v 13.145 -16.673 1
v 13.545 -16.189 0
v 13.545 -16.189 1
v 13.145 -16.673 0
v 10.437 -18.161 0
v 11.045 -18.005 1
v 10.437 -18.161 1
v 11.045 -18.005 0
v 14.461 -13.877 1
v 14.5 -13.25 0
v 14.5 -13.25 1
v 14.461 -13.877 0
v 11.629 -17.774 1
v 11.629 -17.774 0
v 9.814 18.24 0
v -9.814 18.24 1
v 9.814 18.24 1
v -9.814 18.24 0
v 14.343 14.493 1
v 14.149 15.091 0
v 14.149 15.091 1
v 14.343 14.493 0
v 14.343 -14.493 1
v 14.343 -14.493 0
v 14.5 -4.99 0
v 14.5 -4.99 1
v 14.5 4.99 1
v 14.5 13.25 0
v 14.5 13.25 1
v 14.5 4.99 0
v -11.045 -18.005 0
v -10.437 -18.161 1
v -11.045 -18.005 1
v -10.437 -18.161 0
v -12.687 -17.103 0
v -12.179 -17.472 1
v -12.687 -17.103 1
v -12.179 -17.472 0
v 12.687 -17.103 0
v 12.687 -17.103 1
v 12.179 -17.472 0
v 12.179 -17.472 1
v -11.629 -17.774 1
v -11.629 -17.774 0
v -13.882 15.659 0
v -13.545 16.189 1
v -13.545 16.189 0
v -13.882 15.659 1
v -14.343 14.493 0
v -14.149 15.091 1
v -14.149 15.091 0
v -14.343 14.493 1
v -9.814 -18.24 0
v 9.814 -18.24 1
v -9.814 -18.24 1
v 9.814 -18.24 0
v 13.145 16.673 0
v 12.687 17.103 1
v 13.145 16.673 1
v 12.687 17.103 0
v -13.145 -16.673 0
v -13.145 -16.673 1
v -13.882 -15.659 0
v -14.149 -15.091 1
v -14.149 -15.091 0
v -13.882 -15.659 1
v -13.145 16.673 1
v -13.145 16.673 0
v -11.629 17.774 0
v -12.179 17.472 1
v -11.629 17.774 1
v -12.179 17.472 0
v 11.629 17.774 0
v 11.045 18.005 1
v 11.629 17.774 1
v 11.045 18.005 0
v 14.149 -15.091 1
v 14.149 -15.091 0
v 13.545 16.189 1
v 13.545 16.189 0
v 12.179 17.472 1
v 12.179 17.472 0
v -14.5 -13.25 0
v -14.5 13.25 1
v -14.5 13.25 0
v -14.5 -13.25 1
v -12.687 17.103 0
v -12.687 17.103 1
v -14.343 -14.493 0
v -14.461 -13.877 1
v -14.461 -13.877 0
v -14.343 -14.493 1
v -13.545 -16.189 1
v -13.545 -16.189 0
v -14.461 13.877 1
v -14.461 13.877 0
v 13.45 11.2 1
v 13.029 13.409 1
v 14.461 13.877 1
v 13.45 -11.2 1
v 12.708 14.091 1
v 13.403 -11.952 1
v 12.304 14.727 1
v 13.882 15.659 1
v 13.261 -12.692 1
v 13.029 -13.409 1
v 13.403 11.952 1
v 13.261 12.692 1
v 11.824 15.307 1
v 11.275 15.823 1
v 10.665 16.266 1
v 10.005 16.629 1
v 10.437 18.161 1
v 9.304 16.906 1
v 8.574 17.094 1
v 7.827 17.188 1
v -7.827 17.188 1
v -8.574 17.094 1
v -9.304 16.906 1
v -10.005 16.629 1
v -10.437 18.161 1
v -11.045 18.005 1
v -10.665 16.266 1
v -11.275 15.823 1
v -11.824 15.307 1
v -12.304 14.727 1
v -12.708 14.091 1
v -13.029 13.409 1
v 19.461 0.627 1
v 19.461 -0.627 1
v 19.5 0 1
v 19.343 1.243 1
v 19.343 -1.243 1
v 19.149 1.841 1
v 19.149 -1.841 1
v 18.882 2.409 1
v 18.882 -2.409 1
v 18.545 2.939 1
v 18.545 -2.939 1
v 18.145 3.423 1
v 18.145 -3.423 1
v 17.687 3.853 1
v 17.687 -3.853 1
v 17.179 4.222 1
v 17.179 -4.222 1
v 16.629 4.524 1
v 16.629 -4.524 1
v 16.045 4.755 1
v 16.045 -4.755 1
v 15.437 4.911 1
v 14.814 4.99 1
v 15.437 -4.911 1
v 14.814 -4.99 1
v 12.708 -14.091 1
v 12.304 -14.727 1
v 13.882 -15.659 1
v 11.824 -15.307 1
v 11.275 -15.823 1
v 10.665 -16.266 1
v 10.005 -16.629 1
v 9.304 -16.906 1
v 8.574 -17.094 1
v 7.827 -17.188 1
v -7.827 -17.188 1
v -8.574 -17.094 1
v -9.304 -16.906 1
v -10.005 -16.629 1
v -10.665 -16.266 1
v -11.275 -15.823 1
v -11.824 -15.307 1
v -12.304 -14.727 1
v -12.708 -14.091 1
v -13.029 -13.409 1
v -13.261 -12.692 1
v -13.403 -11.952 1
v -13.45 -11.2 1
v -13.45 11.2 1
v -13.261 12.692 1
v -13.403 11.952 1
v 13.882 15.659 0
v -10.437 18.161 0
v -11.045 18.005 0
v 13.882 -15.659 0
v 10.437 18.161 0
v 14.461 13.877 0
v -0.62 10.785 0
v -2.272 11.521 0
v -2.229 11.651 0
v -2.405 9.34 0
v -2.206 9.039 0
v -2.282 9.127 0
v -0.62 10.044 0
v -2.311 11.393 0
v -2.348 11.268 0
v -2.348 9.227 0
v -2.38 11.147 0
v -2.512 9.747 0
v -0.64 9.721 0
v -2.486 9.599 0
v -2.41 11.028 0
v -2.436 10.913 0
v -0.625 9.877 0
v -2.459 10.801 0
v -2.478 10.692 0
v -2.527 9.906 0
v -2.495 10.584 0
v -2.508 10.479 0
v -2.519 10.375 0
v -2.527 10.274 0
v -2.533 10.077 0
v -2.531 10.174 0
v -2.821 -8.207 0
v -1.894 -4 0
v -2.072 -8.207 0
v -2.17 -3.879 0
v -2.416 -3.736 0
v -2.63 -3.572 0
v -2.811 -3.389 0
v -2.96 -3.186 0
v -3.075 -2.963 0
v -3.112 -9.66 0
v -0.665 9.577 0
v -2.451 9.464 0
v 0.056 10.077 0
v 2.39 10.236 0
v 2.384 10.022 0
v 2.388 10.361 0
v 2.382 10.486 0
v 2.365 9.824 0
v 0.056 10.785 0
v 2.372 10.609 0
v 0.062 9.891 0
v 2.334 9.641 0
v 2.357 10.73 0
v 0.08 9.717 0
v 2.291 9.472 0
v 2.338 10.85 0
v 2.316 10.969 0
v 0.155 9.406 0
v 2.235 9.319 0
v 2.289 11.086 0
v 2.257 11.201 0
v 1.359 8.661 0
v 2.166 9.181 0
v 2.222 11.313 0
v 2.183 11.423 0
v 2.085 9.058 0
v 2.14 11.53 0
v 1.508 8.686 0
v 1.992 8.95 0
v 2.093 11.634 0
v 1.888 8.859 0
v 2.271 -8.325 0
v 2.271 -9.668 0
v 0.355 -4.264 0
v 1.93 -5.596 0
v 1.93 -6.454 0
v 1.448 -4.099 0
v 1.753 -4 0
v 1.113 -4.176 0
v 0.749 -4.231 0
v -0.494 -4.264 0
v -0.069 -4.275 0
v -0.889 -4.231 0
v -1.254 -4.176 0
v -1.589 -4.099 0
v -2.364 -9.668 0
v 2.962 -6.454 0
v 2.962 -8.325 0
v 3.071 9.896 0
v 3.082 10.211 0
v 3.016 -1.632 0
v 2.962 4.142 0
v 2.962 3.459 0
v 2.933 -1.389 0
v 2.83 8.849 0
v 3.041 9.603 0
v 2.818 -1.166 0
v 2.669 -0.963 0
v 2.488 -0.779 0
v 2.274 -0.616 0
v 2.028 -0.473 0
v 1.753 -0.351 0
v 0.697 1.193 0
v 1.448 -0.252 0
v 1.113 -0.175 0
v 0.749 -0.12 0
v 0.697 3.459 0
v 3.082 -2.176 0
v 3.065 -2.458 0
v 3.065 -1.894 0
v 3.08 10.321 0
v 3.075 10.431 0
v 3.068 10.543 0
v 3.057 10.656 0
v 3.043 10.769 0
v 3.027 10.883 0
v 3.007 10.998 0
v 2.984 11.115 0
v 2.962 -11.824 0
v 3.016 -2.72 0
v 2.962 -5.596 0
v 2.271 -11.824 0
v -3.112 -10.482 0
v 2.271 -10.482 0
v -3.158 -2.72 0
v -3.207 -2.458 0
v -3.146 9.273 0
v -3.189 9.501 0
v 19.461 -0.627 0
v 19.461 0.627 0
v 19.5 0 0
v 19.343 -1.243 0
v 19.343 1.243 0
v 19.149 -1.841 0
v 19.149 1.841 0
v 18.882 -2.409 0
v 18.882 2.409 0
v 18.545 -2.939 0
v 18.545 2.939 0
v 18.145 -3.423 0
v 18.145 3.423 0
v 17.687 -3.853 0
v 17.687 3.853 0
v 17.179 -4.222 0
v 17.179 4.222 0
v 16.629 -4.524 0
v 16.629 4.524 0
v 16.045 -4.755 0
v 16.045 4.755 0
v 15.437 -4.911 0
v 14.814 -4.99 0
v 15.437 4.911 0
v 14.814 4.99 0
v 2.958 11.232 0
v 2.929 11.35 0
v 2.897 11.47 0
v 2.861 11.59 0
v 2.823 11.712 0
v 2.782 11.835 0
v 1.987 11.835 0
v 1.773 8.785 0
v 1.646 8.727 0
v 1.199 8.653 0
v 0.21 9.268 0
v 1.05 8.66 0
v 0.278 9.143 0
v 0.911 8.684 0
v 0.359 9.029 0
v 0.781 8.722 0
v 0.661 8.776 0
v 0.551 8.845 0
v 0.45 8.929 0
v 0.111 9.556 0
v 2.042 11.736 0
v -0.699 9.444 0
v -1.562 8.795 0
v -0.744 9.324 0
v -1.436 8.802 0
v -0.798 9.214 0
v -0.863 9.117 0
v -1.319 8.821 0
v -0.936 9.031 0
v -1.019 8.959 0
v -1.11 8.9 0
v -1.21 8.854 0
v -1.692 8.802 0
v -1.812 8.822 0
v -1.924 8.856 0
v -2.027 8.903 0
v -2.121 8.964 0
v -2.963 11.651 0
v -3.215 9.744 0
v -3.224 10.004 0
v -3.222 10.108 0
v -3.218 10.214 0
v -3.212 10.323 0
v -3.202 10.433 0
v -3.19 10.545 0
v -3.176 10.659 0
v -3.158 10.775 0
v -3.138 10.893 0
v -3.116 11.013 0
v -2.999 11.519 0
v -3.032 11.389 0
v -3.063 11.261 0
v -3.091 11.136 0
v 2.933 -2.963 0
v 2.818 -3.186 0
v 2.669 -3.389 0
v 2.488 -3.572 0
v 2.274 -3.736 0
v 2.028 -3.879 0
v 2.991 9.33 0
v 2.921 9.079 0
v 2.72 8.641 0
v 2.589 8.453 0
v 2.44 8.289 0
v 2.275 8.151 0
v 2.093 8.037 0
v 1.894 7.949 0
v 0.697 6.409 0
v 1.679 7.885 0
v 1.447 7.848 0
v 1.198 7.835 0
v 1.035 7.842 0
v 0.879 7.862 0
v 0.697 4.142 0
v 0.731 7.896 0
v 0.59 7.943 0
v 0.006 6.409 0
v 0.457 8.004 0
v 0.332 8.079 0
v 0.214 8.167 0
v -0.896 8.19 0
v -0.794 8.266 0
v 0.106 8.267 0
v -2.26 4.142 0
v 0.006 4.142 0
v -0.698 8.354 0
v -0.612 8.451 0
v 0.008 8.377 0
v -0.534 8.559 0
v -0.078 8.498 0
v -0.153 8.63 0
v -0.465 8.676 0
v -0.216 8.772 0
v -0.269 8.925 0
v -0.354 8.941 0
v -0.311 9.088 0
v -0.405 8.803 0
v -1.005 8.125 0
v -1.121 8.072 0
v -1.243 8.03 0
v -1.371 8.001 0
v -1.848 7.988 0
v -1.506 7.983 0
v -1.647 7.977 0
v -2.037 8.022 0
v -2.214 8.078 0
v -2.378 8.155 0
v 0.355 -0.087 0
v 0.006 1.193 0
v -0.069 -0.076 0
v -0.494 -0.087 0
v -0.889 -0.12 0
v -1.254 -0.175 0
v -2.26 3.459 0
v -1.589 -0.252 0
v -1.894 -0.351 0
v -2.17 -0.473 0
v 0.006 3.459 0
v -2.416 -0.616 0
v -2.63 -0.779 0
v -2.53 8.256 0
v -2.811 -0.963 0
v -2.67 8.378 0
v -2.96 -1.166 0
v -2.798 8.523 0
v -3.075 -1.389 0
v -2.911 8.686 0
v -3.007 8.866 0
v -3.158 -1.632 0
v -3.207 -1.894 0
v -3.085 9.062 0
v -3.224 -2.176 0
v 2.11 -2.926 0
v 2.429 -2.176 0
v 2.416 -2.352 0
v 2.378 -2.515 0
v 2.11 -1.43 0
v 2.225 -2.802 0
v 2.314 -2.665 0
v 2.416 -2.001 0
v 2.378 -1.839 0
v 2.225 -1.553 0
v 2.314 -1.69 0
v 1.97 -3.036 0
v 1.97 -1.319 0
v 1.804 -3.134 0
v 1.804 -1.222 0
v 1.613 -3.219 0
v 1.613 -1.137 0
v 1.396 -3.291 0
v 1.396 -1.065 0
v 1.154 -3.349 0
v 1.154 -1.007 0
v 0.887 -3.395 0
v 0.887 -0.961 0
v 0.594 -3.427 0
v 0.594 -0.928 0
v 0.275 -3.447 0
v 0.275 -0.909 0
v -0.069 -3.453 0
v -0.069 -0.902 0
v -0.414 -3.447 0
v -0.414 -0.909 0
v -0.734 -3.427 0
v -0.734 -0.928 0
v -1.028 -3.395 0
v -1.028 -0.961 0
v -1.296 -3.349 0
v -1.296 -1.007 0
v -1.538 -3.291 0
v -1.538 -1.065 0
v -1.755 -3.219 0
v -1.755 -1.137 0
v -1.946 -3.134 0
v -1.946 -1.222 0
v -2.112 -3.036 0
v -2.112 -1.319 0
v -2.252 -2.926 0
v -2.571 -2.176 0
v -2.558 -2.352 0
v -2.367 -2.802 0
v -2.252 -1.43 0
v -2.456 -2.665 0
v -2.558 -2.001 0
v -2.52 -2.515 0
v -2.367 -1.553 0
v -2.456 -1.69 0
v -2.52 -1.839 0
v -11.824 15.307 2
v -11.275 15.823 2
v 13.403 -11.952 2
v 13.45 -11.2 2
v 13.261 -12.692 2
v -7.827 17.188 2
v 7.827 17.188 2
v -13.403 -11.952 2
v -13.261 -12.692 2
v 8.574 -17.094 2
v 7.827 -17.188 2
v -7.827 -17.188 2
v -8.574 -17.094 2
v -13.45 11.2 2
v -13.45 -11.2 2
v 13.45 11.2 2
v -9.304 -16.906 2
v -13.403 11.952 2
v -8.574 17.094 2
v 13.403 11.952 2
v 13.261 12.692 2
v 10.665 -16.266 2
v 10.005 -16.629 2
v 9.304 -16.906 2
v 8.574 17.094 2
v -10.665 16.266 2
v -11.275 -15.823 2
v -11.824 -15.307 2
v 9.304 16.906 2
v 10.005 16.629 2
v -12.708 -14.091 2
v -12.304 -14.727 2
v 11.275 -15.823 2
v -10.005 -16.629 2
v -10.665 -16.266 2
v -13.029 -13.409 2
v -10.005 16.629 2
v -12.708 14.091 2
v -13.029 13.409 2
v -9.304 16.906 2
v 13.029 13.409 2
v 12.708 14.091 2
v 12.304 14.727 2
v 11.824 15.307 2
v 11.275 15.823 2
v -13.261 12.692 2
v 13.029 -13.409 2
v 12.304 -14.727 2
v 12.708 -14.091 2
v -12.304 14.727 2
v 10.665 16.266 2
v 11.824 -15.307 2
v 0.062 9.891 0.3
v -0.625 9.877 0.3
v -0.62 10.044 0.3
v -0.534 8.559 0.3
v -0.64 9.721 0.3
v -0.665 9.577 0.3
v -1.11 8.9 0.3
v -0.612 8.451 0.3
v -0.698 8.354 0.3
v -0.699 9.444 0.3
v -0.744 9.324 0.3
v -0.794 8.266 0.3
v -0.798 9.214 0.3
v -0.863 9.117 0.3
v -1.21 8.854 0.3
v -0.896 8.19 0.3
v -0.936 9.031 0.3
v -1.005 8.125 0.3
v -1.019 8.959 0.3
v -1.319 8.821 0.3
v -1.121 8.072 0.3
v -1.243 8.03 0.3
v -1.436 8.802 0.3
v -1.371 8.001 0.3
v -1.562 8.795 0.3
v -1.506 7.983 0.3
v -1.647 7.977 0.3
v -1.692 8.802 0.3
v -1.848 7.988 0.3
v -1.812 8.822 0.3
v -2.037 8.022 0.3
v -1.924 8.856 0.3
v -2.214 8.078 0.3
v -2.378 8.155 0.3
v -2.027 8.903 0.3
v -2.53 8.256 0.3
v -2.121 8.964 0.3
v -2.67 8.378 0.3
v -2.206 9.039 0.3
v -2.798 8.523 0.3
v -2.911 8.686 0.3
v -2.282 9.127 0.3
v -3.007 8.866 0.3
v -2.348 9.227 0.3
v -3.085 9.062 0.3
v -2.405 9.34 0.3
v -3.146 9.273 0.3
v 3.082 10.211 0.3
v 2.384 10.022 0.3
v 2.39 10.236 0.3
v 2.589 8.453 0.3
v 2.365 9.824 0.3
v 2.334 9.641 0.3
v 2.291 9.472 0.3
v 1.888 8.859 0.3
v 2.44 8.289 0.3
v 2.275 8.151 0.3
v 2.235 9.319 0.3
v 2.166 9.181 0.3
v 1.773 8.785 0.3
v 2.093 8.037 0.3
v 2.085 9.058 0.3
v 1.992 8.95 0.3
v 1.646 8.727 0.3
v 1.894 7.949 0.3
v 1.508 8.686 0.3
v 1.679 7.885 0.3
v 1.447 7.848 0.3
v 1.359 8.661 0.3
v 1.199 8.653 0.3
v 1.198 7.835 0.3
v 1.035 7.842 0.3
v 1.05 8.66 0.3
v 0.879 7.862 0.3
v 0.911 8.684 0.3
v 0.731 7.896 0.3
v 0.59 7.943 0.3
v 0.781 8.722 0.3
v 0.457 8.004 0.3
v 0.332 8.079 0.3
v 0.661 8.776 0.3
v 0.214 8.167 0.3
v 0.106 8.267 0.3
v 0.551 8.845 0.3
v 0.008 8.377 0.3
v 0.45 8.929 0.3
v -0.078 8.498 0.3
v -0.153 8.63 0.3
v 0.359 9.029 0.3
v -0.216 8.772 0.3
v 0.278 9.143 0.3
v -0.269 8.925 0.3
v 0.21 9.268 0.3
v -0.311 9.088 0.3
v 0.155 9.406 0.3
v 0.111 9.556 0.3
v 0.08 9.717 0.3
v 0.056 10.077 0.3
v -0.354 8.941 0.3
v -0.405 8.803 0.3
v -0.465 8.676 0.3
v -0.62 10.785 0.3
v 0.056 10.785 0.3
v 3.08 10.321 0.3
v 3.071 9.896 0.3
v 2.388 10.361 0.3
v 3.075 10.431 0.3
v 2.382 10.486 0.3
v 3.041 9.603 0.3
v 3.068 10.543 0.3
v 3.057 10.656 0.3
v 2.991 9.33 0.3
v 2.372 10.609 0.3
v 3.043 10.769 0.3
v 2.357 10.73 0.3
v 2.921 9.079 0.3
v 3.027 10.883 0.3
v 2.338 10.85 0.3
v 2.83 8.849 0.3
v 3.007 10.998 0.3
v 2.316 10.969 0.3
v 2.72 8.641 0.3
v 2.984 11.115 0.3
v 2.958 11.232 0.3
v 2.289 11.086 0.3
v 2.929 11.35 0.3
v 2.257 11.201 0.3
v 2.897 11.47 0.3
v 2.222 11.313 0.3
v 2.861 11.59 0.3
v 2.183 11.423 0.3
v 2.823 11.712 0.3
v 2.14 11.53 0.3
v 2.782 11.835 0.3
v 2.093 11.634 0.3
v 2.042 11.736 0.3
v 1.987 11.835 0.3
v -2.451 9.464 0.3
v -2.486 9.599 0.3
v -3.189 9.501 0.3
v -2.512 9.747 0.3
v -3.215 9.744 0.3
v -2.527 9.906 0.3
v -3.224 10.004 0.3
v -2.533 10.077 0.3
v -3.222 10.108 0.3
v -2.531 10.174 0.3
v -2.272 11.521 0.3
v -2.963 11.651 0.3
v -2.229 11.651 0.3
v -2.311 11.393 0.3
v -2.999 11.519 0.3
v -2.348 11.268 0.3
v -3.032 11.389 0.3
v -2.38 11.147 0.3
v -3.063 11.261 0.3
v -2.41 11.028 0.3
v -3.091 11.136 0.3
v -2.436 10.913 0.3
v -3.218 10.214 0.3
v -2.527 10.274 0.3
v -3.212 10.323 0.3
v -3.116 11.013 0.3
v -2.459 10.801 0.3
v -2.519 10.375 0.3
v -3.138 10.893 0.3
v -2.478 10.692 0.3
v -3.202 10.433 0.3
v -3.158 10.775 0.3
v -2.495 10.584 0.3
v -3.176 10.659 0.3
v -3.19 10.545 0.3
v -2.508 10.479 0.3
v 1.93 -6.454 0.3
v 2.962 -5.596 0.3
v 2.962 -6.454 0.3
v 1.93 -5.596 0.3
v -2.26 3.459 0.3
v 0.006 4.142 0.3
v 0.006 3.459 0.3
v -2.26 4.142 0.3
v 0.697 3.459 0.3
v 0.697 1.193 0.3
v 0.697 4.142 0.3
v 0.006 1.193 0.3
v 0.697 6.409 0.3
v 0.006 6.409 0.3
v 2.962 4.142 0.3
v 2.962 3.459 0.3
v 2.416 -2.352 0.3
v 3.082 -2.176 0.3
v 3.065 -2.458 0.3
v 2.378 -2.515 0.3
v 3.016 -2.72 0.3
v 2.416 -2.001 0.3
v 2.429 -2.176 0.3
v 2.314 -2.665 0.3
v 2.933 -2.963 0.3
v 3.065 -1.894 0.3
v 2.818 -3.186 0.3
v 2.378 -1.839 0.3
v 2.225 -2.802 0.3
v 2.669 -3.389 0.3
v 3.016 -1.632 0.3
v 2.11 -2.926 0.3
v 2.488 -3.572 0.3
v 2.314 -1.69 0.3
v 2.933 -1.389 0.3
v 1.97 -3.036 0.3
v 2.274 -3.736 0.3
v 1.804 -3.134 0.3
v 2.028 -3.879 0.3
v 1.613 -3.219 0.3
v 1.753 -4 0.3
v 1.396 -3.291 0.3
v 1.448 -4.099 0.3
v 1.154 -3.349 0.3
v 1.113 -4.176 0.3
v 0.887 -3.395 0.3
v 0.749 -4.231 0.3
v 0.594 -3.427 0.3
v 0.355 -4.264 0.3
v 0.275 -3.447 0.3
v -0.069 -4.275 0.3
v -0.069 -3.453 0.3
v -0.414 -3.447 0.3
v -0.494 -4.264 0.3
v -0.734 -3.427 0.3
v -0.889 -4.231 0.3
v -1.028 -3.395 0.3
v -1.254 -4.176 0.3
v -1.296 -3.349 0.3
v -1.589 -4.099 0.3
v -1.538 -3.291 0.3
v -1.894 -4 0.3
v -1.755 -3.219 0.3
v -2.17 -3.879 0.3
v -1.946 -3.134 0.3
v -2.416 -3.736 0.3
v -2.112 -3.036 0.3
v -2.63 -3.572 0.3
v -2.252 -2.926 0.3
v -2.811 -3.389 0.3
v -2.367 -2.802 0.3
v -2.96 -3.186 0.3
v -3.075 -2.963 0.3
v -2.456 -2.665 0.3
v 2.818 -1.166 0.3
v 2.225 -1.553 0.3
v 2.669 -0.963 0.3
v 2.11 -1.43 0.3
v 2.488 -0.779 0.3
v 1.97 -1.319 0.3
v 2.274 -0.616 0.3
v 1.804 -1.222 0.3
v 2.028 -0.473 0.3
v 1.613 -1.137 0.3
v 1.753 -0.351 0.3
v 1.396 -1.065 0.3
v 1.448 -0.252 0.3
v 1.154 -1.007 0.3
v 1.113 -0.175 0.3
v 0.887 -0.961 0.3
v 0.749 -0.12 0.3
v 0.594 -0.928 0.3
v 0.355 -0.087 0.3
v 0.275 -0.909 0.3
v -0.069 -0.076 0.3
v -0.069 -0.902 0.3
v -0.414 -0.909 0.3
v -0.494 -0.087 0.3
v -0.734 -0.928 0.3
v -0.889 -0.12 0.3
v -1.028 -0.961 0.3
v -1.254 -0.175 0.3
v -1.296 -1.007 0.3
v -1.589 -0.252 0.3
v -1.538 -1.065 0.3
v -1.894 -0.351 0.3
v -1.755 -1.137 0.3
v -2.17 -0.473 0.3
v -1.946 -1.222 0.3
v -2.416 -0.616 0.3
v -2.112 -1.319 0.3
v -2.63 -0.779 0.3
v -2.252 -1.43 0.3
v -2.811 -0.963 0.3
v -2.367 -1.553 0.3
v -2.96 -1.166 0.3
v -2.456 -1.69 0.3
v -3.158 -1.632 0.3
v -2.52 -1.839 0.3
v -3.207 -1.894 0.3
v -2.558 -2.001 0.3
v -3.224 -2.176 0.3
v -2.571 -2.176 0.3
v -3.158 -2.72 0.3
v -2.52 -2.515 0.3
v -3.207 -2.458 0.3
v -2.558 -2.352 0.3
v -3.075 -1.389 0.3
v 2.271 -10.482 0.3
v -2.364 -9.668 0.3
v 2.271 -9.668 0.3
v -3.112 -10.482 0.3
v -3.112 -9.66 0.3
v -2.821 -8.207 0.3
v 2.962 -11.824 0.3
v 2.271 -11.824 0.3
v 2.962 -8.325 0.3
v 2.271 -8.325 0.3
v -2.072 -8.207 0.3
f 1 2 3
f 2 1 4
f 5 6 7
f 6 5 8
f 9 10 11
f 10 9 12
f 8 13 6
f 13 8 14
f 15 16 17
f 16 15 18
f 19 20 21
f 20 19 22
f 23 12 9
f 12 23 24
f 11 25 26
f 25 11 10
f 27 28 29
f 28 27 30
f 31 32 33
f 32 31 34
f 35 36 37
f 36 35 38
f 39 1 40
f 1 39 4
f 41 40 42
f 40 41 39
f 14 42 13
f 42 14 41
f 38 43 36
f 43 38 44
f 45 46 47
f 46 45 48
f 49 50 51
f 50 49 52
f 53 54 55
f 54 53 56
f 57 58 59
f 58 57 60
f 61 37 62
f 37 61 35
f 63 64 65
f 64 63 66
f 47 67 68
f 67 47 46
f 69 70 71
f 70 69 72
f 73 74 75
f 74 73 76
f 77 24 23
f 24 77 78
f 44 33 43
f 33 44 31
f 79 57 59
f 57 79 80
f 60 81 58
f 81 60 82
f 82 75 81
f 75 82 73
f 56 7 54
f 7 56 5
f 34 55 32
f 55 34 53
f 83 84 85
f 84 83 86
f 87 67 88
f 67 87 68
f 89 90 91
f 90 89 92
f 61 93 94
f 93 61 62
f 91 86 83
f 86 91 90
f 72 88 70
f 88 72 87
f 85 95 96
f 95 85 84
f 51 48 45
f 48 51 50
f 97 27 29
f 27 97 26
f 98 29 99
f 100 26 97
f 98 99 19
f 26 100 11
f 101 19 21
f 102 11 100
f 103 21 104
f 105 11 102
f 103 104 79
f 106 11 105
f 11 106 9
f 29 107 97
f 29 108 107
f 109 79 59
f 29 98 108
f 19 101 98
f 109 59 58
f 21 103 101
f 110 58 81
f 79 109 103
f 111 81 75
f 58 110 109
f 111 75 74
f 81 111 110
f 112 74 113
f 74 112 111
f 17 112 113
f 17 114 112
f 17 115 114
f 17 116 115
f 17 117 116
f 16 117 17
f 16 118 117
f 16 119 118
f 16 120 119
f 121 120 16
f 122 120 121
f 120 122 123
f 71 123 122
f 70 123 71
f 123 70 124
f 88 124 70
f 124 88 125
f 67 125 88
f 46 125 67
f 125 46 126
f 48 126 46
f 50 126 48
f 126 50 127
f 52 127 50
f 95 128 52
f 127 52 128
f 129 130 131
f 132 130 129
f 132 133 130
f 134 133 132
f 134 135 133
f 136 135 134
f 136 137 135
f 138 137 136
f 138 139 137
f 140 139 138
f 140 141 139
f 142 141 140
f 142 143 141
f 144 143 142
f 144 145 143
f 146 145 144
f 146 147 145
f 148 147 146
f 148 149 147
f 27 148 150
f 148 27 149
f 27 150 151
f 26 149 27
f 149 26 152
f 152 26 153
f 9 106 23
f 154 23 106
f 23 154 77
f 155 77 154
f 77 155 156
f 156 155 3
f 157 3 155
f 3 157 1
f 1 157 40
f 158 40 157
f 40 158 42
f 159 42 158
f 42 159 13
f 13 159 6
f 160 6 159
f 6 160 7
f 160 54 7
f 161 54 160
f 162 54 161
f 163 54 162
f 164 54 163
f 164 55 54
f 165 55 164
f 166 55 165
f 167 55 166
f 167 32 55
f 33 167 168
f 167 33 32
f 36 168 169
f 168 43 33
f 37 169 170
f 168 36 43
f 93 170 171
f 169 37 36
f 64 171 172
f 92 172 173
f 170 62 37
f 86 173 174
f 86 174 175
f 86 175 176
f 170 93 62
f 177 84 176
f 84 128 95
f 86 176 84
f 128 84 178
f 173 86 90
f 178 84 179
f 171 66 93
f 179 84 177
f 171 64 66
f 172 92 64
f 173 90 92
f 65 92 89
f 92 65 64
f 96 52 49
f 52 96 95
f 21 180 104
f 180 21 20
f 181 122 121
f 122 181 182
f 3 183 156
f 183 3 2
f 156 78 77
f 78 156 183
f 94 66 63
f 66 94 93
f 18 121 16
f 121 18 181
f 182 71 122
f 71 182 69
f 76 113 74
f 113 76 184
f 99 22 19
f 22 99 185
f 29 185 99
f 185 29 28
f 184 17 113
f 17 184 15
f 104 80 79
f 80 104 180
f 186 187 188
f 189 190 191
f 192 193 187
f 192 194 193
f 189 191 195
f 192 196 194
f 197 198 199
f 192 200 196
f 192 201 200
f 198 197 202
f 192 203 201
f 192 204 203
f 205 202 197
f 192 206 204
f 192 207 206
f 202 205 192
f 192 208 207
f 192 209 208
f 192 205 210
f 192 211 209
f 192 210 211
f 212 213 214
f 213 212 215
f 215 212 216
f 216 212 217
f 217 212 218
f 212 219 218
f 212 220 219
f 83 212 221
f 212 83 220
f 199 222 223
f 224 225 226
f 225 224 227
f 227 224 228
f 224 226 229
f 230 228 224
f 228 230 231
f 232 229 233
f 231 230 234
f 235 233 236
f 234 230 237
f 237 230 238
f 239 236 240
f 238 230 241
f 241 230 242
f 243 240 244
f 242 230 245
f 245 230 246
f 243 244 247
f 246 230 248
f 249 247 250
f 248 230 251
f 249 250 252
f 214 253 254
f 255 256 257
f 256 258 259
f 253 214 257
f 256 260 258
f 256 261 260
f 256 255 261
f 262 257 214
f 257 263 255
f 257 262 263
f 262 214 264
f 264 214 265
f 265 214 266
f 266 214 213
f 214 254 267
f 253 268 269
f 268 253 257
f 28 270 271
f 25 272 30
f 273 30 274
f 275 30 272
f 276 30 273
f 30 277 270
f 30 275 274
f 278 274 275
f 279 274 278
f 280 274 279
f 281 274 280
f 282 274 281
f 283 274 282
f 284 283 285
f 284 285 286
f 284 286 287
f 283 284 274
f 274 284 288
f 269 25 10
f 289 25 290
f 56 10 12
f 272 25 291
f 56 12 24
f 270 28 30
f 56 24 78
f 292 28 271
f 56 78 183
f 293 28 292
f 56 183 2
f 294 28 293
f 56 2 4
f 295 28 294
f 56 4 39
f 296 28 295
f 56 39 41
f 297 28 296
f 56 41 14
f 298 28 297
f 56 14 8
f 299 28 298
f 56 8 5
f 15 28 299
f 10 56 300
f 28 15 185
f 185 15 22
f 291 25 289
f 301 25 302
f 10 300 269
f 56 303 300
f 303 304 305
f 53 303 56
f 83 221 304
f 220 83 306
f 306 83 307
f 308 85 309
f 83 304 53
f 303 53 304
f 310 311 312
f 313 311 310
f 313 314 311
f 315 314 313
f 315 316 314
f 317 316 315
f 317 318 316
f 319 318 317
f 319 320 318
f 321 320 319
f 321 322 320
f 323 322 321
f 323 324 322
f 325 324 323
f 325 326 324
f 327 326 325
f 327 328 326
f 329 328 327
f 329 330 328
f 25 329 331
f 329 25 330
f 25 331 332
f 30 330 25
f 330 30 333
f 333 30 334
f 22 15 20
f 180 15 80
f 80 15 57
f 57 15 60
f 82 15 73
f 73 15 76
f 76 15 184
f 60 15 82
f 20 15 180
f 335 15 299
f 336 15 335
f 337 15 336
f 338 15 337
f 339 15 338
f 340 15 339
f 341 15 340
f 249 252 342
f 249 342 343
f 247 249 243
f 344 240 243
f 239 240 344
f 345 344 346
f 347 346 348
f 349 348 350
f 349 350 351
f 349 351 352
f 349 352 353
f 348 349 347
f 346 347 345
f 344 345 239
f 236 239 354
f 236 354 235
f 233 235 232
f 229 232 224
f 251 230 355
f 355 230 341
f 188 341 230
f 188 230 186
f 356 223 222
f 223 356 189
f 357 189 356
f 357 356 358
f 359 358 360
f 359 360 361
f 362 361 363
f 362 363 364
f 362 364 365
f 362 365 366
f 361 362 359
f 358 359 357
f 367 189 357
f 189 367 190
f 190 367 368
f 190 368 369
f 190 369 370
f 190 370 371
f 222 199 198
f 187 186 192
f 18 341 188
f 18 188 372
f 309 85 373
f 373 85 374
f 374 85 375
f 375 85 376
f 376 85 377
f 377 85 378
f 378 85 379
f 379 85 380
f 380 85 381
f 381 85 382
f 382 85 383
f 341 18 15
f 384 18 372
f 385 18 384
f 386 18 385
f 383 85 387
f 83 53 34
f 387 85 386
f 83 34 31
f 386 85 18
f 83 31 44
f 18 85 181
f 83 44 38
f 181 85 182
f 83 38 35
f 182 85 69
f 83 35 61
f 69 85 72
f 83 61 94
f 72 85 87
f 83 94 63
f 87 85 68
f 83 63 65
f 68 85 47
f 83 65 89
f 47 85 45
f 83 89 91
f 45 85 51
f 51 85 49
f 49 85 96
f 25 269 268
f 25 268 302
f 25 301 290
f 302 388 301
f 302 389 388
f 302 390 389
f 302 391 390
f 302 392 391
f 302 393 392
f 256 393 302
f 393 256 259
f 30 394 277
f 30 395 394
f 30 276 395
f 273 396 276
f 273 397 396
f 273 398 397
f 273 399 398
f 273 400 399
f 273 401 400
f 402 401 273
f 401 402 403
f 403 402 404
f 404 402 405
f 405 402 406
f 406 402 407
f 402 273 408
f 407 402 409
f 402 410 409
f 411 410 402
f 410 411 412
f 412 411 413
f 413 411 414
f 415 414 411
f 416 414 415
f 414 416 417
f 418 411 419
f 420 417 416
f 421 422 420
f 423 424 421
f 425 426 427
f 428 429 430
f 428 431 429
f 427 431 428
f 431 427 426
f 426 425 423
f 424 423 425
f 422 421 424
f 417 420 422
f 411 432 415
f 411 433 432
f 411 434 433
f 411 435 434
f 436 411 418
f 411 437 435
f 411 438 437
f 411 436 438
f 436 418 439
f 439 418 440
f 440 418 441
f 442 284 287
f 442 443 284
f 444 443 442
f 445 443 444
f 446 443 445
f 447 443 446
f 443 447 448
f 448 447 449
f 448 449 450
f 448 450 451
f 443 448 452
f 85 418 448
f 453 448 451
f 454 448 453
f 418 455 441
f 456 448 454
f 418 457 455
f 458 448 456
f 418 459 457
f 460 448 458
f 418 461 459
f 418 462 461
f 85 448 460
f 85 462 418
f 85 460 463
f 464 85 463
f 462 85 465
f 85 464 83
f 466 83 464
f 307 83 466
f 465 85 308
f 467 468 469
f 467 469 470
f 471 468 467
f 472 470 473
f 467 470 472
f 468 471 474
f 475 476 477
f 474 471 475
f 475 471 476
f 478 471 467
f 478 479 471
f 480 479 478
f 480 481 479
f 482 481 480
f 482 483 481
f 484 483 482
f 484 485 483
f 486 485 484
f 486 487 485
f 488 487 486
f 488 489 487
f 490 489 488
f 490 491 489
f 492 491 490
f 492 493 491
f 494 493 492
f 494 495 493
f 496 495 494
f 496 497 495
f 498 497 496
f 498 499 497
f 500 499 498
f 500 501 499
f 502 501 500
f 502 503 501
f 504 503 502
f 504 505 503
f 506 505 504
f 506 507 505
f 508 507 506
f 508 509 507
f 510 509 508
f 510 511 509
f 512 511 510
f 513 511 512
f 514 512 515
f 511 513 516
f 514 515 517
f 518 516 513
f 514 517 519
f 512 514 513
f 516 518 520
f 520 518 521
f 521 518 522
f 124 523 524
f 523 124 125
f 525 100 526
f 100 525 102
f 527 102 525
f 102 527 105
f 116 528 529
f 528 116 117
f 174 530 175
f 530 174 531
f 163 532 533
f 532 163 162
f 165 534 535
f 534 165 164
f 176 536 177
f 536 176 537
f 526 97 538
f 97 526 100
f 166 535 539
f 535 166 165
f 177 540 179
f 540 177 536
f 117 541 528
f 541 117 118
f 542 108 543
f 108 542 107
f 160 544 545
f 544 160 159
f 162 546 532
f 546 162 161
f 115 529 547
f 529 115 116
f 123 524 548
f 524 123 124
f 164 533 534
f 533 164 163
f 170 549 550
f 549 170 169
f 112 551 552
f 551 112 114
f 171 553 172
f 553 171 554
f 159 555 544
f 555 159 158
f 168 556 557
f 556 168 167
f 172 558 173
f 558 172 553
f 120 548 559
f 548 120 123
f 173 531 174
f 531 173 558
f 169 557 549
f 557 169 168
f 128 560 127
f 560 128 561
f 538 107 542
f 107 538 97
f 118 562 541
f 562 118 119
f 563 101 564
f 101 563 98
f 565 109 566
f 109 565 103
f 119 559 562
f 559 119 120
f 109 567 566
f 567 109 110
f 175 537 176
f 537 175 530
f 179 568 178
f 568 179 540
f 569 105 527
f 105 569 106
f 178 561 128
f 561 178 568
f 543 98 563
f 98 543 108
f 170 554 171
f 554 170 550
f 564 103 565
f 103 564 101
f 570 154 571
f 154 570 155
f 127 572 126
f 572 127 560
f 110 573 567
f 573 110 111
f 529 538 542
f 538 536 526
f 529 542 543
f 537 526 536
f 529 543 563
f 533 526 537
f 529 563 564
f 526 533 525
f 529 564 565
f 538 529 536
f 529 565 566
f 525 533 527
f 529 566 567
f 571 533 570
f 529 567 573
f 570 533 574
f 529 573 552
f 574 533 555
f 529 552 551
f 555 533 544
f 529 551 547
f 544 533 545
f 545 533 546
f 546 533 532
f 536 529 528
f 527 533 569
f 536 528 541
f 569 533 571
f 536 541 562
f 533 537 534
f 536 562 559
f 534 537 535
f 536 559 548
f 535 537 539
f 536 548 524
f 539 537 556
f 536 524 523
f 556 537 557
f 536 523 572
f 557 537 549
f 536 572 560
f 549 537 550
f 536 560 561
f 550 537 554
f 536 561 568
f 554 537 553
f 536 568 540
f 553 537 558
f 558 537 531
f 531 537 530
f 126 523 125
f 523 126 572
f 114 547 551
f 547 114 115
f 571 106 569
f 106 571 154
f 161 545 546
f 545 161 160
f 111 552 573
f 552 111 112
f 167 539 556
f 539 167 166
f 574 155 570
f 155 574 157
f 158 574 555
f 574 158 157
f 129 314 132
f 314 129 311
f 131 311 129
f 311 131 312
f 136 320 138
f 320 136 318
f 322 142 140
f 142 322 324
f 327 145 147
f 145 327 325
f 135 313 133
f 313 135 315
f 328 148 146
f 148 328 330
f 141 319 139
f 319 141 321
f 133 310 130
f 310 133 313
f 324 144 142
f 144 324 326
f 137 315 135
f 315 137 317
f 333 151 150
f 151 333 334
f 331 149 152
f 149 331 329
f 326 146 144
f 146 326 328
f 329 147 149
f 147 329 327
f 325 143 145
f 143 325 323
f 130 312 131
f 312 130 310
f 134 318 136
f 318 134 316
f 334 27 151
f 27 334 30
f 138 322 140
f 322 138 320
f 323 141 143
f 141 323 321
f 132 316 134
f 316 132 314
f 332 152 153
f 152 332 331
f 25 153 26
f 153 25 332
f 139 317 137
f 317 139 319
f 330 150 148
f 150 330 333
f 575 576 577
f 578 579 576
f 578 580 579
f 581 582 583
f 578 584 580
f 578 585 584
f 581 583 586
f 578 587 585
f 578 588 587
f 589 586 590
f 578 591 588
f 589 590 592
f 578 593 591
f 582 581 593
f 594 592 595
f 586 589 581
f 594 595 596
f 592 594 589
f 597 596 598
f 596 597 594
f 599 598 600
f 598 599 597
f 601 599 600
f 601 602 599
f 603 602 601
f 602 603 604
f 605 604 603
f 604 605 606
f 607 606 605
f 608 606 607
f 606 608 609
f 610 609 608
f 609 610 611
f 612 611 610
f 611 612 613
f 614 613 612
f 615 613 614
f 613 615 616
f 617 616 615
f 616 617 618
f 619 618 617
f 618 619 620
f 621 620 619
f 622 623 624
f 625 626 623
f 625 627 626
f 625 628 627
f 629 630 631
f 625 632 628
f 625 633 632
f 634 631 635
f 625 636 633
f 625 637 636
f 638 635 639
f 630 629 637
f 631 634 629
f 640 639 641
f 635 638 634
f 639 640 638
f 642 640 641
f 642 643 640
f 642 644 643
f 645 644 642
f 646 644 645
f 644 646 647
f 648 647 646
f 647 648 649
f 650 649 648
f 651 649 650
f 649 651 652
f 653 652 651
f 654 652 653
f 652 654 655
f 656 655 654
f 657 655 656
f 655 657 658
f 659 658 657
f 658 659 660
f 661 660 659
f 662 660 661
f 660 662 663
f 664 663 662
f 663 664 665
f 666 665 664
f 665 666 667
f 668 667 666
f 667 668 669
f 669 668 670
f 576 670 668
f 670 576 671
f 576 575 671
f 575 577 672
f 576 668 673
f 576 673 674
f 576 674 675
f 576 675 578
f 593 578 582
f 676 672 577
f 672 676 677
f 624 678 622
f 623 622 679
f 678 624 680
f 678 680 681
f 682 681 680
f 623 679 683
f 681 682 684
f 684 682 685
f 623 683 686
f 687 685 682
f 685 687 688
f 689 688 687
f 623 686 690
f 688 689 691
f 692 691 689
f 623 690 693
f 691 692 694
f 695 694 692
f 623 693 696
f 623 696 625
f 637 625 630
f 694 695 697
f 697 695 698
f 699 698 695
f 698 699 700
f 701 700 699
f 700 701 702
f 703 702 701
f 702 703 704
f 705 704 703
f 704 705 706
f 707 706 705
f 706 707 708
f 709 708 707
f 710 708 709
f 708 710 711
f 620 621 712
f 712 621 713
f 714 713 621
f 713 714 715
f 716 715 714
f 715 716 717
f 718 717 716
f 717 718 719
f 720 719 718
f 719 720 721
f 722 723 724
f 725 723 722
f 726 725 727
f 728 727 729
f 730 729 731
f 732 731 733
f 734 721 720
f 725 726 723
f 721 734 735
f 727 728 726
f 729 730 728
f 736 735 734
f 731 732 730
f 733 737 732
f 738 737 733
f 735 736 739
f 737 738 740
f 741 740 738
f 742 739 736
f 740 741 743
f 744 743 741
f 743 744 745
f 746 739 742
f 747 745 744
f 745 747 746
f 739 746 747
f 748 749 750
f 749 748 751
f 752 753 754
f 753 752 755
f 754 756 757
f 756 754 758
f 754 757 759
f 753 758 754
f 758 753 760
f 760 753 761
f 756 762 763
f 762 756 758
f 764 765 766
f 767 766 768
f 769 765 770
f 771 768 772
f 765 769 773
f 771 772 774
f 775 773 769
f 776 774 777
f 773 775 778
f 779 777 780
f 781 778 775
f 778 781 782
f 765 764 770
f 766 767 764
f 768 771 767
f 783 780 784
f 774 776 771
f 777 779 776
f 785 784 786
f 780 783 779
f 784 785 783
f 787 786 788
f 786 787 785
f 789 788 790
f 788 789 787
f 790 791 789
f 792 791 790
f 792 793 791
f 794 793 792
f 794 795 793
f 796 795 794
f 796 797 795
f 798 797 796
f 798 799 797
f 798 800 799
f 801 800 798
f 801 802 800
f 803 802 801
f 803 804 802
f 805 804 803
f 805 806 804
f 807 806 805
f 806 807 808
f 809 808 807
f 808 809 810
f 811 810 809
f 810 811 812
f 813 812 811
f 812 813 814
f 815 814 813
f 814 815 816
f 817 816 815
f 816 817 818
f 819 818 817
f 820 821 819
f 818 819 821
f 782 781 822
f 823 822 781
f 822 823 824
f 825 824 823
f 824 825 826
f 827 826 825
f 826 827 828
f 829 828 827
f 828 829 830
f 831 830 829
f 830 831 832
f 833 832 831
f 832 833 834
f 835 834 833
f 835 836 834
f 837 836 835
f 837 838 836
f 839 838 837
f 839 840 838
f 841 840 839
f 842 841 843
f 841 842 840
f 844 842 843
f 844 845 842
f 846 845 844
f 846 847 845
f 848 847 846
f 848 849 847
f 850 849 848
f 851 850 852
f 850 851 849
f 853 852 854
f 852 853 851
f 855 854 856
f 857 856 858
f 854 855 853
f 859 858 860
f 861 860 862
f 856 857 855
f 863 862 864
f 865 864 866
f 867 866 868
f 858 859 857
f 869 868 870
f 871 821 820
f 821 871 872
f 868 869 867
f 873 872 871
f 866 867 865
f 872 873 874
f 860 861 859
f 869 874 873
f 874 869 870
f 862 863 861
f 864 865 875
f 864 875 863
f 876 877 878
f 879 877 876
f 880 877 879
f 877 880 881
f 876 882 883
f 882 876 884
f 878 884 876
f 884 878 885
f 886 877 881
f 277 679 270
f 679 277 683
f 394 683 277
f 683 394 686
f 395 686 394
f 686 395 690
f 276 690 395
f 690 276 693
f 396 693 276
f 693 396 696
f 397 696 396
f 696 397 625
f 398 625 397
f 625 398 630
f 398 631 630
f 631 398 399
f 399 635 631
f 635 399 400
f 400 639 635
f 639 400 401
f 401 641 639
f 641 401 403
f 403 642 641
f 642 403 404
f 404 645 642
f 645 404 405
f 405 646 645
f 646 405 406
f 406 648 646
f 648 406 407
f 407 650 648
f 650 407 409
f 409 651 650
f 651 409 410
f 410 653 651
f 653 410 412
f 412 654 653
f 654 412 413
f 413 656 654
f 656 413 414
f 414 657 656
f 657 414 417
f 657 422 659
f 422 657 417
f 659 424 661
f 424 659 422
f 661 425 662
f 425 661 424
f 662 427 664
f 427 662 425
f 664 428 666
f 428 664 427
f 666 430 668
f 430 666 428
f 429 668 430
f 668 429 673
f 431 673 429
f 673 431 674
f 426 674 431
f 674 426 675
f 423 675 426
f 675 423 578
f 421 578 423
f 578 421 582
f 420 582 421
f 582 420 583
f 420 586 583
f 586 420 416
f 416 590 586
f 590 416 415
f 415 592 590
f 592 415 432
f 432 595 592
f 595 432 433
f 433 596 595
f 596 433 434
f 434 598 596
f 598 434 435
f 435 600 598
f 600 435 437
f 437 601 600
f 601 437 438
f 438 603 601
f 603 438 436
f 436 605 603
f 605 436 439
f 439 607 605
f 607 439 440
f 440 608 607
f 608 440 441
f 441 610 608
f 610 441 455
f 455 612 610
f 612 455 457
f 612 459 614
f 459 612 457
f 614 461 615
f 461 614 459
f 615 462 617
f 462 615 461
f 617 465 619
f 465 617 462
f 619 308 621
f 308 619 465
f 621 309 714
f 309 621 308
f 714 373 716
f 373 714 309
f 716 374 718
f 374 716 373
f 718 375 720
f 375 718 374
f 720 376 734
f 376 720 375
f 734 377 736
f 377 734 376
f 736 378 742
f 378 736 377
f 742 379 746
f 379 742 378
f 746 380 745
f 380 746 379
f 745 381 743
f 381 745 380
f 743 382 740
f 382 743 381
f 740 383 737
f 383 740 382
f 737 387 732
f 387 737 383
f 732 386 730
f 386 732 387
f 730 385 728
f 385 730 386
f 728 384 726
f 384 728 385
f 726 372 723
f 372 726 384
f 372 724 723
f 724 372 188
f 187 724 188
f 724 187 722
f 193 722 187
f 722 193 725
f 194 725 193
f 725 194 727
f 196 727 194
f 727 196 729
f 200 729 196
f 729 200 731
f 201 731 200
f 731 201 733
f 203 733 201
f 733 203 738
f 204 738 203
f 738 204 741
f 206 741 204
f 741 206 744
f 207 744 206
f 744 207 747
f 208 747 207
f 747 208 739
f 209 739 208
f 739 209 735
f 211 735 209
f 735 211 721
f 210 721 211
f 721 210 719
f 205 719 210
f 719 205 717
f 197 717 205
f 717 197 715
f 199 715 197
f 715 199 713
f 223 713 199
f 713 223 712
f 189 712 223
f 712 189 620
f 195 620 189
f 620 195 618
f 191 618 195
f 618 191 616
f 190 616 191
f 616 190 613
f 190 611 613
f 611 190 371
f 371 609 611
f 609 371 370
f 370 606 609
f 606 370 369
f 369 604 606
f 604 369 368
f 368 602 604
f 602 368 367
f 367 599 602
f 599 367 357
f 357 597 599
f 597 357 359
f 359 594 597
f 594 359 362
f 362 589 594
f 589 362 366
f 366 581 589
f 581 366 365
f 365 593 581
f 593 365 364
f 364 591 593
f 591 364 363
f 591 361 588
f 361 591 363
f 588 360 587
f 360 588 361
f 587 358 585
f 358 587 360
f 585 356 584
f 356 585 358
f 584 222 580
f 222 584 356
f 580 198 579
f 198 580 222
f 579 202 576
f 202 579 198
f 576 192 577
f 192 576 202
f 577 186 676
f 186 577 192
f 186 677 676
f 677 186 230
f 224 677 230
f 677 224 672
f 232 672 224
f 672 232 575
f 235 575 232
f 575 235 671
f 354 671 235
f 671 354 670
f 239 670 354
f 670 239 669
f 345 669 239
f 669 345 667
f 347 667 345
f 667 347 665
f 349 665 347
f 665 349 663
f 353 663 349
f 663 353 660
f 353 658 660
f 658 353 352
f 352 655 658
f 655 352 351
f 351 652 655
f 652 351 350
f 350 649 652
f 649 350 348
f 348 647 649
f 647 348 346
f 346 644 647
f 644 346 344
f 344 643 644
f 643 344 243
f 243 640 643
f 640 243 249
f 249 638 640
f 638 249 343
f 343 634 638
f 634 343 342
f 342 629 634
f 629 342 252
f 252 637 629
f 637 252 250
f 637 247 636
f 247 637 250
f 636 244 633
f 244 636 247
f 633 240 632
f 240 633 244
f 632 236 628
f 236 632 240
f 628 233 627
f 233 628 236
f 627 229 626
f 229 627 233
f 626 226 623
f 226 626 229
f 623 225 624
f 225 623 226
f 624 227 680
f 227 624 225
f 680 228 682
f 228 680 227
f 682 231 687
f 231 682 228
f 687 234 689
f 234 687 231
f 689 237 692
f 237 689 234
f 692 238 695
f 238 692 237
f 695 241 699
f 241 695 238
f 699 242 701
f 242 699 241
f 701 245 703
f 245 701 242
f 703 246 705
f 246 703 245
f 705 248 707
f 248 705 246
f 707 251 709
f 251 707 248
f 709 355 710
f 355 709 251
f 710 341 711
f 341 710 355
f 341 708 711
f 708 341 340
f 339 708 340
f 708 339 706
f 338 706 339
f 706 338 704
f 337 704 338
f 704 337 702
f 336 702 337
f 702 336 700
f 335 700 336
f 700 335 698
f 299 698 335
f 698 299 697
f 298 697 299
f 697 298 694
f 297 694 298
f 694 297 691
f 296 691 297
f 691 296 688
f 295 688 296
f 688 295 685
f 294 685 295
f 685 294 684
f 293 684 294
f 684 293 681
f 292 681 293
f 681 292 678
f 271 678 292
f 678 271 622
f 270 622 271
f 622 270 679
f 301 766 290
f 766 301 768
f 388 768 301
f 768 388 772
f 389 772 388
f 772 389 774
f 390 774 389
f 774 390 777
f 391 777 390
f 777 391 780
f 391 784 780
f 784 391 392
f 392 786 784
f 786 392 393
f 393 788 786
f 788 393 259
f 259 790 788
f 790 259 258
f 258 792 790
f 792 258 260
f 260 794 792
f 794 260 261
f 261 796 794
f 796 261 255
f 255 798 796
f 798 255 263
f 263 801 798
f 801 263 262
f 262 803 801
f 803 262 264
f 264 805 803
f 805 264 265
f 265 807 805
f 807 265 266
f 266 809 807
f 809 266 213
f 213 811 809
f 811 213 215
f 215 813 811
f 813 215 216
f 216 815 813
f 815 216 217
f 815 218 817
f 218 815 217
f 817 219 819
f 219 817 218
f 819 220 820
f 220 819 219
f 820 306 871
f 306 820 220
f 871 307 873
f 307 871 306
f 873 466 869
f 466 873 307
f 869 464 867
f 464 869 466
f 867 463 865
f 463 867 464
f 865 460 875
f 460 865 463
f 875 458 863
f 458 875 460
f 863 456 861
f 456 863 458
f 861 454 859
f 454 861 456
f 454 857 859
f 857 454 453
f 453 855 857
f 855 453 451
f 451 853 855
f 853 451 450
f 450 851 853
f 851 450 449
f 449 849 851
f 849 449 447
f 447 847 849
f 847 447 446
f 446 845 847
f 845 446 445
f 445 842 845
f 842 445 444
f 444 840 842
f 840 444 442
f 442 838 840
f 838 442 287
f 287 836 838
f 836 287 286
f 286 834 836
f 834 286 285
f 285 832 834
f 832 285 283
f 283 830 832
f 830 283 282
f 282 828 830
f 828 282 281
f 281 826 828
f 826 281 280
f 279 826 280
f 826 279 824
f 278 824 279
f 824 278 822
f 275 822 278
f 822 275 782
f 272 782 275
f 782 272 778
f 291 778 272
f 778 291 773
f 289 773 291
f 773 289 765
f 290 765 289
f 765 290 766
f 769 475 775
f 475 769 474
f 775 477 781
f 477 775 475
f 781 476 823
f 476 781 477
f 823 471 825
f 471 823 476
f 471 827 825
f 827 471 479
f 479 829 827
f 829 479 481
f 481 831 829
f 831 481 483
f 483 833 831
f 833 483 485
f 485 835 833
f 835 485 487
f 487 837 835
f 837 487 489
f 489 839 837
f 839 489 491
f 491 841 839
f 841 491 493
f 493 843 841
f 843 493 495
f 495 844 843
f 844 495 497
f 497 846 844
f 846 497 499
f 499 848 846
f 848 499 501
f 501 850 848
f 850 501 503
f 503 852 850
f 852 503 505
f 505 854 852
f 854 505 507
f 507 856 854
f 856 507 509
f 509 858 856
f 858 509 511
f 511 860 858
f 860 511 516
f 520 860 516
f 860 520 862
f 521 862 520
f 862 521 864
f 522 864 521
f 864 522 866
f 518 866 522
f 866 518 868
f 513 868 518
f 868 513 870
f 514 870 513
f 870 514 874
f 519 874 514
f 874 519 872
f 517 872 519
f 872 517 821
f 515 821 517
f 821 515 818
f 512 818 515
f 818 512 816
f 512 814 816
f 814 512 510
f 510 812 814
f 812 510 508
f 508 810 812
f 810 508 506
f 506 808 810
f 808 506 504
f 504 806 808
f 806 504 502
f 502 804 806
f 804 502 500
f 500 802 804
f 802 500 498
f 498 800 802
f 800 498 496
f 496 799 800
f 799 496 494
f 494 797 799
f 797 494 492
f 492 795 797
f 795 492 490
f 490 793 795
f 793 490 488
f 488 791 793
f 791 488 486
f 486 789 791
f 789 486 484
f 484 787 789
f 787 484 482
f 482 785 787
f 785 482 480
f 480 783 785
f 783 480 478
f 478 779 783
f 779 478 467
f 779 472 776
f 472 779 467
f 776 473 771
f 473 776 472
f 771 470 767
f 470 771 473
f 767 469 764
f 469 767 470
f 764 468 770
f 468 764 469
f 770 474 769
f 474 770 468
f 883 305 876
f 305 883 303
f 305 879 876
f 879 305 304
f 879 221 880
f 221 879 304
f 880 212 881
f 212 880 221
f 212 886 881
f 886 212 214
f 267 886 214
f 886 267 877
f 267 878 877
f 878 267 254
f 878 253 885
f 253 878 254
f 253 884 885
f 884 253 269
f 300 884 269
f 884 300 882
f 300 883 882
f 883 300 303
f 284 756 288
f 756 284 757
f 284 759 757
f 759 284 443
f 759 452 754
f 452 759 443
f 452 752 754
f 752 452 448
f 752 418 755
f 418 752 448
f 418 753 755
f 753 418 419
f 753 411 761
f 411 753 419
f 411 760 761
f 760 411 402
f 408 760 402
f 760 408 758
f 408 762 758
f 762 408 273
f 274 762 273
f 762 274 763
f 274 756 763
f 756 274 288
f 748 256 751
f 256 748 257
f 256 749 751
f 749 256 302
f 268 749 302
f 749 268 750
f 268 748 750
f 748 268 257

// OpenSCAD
$fn = 50;


difference() {
	union() {
		translate(v = [0, 0, 0]) {
			rotate(a = [0, 0, 0]) {
				hull() {
					translate(v = [-9.5000000000, 13.2500000000, 0]) {
						rotate(a = [0, 0, 0]) {
							translate(v = [0, 0, 0]) {
								rotate(a = [0, 0, 0]) {
									cylinder(h = 1, r = 5);
								}
							}
						}
					}
					translate(v = [9.5000000000, 13.2500000000, 0]) {
						rotate(a = [0, 0, 0]) {
							translate(v = [0, 0, 0]) {
								rotate(a = [0, 0, 0]) {
									cylinder(h = 1, r = 5);
								}
							}
						}
					}
					translate(v = [-9.5000000000, -13.2500000000, 0]) {
						rotate(a = [0, 0, 0]) {
							translate(v = [0, 0, 0]) {
								rotate(a = [0, 0, 0]) {
									cylinder(h = 1, r = 5);
								}
							}
						}
					}
					translate(v = [9.5000000000, -13.2500000000, 0]) {
						rotate(a = [0, 0, 0]) {
							translate(v = [0, 0, 0]) {
								rotate(a = [0, 0, 0]) {
									cylinder(h = 1, r = 5);
								}
							}
						}
					}
				}
			}
		}
		translate(v = [0, 0, 0]) {
			rotate(a = [0, 0, 0]) {
				hull() {
					translate(v = [-7.4500000000, 11.2000000000, 0]) {
						rotate(a = [0, 0, 0]) {
							translate(v = [0, 0, 0]) {
								rotate(a = [0, 0, 0]) {
									cylinder(h = 2, r = 6);
								}
							}
						}
					}
					translate(v = [7.4500000000, 11.2000000000, 0]) {
						rotate(a = [0, 0, 0]) {
							translate(v = [0, 0, 0]) {
								rotate(a = [0, 0, 0]) {
									cylinder(h = 2, r = 6);
								}
							}
						}
					}
					translate(v = [-7.4500000000, -11.2000000000, 0]) {
						rotate(a = [0, 0, 0]) {
							translate(v = [0, 0, 0]) {
								rotate(a = [0, 0, 0]) {
									cylinder(h = 2, r = 6);
								}
							}
						}
					}
					translate(v = [7.4500000000, -11.2000000000, 0]) {
						rotate(a = [0, 0, 0]) {
							translate(v = [0, 0, 0]) {
								rotate(a = [0, 0, 0]) {
									cylinder(h = 2, r = 6);
								}
							}
						}
					}
				}
			}
		}
		translate(v = [14.5000000000, 0, 0.0000000000]) {
			rotate(a = [0, 0, 0]) {
				cylinder(h = 1, r = 5);
			}
		}
	}
	union() {
		translate(v = [0, 0, 0.3000000000]) {
			rotate(a = [0, 180, 90]) {
				linear_extrude(height = 0.3000000000) {
					text(font = "Candara:Light", halign = "center", size = 6, text = "3+0.1", valign = "center");
				}
			}
		}
	}
}
